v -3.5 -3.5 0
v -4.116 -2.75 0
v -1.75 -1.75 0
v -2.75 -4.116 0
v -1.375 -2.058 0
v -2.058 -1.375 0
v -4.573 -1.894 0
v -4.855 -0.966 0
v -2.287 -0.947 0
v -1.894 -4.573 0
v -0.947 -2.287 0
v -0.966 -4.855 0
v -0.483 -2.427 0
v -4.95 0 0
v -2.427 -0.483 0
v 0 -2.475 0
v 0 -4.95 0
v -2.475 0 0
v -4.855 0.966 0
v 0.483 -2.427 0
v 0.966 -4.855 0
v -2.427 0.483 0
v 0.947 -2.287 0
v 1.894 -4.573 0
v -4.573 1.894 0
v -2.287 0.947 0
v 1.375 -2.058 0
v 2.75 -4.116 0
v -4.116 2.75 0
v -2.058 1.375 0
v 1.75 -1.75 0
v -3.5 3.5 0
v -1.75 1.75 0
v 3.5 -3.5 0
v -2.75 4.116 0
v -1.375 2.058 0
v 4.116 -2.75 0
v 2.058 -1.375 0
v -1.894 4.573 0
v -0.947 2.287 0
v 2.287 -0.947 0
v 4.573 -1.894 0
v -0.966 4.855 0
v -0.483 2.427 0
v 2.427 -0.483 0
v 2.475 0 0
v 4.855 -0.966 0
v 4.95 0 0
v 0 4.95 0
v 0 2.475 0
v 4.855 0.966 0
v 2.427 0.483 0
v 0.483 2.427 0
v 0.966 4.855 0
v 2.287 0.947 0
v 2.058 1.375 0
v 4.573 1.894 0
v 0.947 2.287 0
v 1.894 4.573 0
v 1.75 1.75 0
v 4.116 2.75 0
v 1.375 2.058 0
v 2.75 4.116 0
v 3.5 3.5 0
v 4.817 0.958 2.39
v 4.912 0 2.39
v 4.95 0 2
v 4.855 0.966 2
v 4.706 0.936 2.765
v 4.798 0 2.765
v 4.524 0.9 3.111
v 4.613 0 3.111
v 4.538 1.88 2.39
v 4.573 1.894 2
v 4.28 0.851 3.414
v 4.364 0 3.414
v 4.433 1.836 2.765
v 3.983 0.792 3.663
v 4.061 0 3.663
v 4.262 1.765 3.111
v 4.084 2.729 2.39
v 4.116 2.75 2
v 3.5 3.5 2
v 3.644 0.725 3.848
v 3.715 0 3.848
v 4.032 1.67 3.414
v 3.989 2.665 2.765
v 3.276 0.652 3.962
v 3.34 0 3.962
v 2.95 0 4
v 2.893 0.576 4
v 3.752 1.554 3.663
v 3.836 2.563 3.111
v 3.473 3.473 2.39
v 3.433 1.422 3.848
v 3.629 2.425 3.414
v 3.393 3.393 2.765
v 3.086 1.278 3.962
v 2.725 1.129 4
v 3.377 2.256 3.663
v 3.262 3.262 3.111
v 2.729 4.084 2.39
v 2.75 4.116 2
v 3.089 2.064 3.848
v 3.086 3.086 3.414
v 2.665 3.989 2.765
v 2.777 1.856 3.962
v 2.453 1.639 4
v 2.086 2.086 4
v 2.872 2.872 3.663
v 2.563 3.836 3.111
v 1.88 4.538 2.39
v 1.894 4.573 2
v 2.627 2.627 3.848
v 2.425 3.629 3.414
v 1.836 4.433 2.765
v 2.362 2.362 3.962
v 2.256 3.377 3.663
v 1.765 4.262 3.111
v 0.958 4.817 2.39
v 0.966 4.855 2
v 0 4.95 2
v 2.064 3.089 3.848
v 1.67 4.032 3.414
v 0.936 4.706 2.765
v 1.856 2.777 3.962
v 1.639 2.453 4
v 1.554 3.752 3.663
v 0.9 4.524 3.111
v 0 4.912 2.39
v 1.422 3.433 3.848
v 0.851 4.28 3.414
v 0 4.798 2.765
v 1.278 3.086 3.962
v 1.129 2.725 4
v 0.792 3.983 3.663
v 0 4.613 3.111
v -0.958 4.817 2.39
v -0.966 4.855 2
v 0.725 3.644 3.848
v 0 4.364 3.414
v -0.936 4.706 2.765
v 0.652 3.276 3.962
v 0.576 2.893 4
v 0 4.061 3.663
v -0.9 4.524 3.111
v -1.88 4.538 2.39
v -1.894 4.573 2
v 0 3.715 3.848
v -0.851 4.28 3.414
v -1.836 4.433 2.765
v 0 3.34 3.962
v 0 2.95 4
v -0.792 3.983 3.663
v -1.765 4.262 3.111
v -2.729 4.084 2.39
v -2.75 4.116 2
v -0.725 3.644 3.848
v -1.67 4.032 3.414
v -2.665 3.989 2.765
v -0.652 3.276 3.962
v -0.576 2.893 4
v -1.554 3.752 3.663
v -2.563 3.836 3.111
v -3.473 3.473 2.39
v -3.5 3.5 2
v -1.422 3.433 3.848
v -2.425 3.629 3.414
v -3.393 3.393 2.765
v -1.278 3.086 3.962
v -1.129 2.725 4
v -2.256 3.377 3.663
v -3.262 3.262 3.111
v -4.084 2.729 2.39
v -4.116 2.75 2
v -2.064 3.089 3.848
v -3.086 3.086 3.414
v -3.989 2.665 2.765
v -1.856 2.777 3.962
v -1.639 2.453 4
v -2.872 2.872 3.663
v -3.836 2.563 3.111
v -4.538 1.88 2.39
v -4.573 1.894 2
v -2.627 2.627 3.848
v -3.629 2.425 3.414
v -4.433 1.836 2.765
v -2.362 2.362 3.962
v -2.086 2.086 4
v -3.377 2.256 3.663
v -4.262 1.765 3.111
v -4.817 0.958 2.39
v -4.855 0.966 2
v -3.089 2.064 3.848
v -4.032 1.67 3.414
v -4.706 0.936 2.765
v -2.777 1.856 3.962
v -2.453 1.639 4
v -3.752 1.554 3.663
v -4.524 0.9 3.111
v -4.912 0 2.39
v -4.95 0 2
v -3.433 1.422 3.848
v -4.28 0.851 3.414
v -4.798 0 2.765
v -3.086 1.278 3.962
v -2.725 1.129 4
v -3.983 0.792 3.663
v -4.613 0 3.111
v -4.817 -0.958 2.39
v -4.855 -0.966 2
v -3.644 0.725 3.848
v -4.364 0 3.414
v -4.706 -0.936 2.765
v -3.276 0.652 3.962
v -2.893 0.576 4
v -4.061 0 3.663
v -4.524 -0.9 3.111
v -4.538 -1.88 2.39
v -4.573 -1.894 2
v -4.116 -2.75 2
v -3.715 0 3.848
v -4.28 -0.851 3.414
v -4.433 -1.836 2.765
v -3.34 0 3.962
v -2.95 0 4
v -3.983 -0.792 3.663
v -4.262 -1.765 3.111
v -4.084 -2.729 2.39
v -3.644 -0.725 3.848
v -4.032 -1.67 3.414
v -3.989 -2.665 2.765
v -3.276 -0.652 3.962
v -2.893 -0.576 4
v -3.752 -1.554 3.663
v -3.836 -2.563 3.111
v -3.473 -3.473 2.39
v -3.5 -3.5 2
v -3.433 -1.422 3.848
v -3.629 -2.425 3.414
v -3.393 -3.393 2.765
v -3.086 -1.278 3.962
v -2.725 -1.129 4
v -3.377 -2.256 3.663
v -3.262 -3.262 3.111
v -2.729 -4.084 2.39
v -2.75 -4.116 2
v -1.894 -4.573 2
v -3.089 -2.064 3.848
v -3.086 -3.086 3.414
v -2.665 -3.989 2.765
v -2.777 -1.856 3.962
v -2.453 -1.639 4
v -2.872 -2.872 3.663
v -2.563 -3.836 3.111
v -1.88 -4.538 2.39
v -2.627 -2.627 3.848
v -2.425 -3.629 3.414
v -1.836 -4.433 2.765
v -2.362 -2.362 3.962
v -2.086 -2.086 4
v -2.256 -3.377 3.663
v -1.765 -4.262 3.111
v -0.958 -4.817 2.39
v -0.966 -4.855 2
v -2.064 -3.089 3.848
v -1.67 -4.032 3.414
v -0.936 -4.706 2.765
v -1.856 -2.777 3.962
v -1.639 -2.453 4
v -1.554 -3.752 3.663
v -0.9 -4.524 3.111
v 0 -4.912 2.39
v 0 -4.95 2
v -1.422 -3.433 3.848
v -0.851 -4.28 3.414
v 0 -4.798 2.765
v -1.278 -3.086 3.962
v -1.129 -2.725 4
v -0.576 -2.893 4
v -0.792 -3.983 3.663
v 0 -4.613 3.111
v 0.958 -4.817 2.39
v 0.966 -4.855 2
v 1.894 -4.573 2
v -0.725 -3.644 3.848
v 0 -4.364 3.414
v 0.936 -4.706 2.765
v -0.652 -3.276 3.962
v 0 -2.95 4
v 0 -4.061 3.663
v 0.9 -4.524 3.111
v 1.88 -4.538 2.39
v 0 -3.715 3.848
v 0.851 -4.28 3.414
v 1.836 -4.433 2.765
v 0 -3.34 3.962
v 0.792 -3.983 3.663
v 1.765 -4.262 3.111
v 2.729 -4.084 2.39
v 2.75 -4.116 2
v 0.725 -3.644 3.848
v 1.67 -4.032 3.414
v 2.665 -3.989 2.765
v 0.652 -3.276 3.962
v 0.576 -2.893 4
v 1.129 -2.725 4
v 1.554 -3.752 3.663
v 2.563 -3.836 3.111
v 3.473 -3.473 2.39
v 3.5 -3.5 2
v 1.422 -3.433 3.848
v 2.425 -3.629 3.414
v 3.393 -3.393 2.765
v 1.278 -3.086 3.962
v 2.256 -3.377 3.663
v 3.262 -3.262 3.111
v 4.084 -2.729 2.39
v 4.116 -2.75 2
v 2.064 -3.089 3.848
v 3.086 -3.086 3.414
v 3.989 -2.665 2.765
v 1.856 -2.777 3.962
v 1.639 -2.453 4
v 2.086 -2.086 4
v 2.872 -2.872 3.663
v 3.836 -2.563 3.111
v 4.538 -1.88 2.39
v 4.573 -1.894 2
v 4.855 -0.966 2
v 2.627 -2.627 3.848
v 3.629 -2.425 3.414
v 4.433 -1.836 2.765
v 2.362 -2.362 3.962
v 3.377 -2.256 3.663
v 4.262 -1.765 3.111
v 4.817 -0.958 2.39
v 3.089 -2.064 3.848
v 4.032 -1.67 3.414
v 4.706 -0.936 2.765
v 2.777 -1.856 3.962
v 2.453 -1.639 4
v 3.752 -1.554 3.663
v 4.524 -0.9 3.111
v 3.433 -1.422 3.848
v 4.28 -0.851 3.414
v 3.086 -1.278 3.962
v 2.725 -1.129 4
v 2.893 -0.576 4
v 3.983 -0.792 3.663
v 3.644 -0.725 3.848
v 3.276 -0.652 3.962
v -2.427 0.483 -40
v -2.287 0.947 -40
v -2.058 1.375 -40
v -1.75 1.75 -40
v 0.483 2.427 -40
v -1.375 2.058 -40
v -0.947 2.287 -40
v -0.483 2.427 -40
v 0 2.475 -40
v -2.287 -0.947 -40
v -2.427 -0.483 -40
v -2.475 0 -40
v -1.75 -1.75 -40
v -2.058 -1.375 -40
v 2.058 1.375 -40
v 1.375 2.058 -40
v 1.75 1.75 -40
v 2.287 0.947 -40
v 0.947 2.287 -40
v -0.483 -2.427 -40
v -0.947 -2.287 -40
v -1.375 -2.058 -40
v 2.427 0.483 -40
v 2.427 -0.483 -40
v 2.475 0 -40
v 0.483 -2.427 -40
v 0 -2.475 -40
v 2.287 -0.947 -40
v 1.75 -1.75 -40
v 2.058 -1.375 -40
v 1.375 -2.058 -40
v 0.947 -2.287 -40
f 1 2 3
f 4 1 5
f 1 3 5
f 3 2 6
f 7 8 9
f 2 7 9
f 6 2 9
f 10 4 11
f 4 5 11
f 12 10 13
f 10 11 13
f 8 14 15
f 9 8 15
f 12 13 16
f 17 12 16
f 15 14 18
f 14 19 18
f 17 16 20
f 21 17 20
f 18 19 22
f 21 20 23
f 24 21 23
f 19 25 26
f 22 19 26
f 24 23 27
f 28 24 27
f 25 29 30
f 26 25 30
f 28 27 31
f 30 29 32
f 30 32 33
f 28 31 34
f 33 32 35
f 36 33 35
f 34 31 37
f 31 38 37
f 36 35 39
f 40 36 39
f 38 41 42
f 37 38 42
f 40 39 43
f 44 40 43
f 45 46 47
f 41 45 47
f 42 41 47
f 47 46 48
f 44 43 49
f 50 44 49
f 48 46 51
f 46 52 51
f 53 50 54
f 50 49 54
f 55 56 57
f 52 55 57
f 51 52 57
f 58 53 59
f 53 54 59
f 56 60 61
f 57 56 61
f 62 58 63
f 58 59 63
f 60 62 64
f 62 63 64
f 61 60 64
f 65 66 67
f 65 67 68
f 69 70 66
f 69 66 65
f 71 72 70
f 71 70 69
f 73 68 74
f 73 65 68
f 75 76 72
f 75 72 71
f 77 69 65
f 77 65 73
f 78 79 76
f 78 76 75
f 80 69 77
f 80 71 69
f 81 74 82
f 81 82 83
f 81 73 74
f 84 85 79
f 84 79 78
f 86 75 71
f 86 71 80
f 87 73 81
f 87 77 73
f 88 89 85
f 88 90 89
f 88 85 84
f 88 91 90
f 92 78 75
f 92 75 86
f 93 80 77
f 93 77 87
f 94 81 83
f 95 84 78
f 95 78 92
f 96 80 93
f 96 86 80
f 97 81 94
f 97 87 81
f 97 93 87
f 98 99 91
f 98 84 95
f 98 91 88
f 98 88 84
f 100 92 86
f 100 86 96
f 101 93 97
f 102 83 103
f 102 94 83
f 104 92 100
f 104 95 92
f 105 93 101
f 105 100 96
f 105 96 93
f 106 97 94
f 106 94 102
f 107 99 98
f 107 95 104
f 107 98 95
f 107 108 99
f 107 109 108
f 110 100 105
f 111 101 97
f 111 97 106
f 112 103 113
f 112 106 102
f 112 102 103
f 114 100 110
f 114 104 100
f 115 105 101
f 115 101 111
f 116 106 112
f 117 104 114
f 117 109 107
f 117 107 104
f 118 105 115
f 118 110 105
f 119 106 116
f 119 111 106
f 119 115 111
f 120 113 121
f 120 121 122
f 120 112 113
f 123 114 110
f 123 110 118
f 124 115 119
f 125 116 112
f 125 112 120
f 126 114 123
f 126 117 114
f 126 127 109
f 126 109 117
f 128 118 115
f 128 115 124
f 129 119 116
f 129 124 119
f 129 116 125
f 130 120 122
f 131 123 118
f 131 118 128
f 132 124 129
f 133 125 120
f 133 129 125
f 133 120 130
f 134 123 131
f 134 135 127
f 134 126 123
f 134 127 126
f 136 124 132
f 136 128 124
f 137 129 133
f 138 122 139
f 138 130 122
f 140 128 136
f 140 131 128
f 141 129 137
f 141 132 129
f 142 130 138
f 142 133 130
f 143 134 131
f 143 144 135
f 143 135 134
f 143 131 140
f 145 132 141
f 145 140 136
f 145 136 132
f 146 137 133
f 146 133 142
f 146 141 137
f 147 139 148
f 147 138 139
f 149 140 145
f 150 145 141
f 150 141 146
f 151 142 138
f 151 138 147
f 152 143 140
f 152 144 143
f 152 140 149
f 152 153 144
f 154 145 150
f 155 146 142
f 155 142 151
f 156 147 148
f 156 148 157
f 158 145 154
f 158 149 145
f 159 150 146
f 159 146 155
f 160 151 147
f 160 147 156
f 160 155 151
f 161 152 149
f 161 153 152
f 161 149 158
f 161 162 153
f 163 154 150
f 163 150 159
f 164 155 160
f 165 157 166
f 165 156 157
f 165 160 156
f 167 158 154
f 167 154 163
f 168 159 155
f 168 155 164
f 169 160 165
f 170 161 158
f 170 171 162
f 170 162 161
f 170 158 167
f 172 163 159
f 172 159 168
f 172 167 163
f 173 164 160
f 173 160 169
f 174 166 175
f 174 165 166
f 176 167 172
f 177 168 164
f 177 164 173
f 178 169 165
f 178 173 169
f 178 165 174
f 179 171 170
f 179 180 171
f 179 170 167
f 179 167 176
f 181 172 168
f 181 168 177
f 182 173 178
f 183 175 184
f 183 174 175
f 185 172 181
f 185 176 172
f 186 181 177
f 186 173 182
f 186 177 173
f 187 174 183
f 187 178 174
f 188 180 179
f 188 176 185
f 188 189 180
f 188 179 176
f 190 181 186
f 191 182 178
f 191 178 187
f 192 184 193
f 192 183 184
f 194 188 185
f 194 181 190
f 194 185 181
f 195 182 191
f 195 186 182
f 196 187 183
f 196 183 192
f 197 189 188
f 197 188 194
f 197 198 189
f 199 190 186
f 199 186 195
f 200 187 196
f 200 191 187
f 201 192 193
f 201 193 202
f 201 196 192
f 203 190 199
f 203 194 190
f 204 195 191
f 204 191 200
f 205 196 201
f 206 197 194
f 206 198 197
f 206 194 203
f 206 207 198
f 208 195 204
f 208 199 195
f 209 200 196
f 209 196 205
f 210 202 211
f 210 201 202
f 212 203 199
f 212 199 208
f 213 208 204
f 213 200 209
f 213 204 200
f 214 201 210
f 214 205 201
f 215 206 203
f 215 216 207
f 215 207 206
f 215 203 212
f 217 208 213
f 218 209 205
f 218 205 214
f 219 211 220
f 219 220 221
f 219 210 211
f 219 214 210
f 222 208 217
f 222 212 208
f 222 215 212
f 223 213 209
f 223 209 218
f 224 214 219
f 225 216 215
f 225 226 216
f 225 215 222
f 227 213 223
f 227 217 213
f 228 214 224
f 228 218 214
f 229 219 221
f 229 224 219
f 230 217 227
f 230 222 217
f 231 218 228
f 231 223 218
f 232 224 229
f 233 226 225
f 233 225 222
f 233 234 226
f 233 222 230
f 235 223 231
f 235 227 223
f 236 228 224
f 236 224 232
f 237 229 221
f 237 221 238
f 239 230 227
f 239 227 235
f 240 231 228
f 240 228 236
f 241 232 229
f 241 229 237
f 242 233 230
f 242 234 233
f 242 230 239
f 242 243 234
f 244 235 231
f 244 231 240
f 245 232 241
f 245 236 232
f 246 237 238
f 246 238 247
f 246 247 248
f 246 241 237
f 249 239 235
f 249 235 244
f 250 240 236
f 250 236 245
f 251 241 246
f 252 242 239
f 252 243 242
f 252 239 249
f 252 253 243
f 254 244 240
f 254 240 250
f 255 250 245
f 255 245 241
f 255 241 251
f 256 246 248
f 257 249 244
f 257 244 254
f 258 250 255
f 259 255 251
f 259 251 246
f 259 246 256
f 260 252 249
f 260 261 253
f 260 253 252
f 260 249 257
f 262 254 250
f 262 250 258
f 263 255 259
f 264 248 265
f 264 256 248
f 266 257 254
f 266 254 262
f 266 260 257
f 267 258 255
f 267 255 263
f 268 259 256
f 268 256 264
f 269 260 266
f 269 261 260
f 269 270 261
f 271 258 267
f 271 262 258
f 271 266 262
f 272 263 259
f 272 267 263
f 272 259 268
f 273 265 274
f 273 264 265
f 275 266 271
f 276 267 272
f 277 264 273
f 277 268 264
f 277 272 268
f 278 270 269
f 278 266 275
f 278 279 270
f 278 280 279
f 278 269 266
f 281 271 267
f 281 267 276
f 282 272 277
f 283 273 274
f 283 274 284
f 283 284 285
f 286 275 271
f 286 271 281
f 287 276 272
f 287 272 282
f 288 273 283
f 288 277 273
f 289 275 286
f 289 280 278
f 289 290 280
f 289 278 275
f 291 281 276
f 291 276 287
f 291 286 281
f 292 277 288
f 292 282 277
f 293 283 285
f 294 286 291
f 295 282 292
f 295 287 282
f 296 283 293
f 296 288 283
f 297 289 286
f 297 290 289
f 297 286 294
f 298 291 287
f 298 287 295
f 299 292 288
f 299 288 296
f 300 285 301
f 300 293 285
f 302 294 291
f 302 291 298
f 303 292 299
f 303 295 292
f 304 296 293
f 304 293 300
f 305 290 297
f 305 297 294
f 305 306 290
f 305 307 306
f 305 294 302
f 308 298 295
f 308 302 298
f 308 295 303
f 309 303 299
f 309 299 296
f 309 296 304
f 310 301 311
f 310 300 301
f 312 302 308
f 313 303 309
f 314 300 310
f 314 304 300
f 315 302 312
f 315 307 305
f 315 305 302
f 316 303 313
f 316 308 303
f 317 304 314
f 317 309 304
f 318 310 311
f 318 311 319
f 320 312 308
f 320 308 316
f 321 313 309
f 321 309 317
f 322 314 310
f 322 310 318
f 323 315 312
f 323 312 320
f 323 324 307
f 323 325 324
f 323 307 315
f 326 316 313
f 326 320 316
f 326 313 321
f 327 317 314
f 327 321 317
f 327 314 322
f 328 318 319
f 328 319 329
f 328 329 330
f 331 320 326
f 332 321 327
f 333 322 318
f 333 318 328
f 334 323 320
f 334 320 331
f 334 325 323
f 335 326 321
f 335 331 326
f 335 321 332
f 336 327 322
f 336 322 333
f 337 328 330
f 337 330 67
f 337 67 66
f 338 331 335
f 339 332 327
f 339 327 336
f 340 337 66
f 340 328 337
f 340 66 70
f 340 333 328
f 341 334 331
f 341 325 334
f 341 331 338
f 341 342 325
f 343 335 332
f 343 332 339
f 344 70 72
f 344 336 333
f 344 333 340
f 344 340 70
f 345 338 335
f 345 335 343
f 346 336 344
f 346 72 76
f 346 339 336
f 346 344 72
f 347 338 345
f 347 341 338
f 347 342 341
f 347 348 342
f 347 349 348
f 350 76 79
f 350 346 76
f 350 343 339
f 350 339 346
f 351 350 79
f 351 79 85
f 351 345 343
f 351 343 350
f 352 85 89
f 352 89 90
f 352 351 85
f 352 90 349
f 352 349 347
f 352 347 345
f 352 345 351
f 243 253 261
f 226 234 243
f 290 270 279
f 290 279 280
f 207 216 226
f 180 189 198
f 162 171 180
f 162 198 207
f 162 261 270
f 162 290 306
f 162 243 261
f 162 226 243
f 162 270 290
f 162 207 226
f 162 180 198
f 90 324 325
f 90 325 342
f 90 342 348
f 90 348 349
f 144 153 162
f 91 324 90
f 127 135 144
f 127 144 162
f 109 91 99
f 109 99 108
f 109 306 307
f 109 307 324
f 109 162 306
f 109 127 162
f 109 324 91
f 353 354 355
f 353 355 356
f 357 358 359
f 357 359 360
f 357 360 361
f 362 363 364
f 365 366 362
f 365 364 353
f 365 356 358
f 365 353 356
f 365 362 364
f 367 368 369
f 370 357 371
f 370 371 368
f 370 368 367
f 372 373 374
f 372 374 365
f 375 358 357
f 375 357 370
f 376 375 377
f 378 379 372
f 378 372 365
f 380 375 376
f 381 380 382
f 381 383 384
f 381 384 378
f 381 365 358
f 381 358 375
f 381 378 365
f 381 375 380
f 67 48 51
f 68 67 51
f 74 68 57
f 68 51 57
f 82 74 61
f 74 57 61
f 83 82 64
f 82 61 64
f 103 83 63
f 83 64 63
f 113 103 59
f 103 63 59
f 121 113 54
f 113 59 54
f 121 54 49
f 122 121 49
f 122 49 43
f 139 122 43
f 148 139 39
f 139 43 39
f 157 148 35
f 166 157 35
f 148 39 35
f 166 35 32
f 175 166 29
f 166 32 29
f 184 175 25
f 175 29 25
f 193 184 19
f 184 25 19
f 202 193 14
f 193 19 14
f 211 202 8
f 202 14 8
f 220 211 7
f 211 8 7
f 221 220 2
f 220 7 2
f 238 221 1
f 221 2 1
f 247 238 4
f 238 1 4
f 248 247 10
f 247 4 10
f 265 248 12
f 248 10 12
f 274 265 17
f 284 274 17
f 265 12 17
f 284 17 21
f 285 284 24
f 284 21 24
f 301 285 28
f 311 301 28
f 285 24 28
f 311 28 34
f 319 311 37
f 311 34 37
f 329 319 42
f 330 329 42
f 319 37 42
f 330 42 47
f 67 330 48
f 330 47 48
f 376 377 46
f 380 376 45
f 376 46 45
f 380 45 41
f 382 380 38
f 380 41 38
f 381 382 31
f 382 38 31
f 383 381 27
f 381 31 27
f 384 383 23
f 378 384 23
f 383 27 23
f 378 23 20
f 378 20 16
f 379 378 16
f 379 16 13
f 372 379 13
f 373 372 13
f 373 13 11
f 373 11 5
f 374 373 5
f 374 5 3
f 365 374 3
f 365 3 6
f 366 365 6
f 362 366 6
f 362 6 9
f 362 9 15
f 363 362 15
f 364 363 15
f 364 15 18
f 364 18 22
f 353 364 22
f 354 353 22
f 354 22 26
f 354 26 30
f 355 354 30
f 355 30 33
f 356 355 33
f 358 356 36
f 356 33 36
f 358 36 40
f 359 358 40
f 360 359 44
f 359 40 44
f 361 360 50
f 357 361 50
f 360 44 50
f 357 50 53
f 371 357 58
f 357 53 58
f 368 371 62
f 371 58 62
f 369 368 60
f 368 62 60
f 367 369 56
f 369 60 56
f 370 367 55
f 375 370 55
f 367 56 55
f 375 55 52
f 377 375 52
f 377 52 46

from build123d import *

# Parameters (mm, degrees)
F0_R     = 4.95
F1_DEPTH = 4
F2_R     = 2
F3_R     = 2.475
F4_DEPTH = 25
F5_DEPTH = 40


with BuildPart() as f1:
    # F0 (on Top) → F1 (new body)
    with BuildSketch(Plane.XY):
        Circle(F0_R)
    extrude(amount=F1_DEPTH)

    # F2
    f2_edges = [f1.edges().sort_by_distance(p)[0] for p in [
        (-4.95, 0, 4),
    ]]
    fillet(f2_edges, radius=F2_R)

    # F3 (on face) → F4 (join)
    with BuildSketch(Plane(origin=(0, 0, 0), x_dir=(1, 0, 0), z_dir=(0, 0, -1))):
        Circle(F3_R)
    extrude(amount=F4_DEPTH)

    # F3 (on face) → F5 (join)
    with BuildSketch(Plane(origin=(0, 0, 0), x_dir=(1, 0, 0), z_dir=(0, 0, -1))):
        Circle(F3_R)
    extrude(amount=F5_DEPTH)


solid = f1.part
